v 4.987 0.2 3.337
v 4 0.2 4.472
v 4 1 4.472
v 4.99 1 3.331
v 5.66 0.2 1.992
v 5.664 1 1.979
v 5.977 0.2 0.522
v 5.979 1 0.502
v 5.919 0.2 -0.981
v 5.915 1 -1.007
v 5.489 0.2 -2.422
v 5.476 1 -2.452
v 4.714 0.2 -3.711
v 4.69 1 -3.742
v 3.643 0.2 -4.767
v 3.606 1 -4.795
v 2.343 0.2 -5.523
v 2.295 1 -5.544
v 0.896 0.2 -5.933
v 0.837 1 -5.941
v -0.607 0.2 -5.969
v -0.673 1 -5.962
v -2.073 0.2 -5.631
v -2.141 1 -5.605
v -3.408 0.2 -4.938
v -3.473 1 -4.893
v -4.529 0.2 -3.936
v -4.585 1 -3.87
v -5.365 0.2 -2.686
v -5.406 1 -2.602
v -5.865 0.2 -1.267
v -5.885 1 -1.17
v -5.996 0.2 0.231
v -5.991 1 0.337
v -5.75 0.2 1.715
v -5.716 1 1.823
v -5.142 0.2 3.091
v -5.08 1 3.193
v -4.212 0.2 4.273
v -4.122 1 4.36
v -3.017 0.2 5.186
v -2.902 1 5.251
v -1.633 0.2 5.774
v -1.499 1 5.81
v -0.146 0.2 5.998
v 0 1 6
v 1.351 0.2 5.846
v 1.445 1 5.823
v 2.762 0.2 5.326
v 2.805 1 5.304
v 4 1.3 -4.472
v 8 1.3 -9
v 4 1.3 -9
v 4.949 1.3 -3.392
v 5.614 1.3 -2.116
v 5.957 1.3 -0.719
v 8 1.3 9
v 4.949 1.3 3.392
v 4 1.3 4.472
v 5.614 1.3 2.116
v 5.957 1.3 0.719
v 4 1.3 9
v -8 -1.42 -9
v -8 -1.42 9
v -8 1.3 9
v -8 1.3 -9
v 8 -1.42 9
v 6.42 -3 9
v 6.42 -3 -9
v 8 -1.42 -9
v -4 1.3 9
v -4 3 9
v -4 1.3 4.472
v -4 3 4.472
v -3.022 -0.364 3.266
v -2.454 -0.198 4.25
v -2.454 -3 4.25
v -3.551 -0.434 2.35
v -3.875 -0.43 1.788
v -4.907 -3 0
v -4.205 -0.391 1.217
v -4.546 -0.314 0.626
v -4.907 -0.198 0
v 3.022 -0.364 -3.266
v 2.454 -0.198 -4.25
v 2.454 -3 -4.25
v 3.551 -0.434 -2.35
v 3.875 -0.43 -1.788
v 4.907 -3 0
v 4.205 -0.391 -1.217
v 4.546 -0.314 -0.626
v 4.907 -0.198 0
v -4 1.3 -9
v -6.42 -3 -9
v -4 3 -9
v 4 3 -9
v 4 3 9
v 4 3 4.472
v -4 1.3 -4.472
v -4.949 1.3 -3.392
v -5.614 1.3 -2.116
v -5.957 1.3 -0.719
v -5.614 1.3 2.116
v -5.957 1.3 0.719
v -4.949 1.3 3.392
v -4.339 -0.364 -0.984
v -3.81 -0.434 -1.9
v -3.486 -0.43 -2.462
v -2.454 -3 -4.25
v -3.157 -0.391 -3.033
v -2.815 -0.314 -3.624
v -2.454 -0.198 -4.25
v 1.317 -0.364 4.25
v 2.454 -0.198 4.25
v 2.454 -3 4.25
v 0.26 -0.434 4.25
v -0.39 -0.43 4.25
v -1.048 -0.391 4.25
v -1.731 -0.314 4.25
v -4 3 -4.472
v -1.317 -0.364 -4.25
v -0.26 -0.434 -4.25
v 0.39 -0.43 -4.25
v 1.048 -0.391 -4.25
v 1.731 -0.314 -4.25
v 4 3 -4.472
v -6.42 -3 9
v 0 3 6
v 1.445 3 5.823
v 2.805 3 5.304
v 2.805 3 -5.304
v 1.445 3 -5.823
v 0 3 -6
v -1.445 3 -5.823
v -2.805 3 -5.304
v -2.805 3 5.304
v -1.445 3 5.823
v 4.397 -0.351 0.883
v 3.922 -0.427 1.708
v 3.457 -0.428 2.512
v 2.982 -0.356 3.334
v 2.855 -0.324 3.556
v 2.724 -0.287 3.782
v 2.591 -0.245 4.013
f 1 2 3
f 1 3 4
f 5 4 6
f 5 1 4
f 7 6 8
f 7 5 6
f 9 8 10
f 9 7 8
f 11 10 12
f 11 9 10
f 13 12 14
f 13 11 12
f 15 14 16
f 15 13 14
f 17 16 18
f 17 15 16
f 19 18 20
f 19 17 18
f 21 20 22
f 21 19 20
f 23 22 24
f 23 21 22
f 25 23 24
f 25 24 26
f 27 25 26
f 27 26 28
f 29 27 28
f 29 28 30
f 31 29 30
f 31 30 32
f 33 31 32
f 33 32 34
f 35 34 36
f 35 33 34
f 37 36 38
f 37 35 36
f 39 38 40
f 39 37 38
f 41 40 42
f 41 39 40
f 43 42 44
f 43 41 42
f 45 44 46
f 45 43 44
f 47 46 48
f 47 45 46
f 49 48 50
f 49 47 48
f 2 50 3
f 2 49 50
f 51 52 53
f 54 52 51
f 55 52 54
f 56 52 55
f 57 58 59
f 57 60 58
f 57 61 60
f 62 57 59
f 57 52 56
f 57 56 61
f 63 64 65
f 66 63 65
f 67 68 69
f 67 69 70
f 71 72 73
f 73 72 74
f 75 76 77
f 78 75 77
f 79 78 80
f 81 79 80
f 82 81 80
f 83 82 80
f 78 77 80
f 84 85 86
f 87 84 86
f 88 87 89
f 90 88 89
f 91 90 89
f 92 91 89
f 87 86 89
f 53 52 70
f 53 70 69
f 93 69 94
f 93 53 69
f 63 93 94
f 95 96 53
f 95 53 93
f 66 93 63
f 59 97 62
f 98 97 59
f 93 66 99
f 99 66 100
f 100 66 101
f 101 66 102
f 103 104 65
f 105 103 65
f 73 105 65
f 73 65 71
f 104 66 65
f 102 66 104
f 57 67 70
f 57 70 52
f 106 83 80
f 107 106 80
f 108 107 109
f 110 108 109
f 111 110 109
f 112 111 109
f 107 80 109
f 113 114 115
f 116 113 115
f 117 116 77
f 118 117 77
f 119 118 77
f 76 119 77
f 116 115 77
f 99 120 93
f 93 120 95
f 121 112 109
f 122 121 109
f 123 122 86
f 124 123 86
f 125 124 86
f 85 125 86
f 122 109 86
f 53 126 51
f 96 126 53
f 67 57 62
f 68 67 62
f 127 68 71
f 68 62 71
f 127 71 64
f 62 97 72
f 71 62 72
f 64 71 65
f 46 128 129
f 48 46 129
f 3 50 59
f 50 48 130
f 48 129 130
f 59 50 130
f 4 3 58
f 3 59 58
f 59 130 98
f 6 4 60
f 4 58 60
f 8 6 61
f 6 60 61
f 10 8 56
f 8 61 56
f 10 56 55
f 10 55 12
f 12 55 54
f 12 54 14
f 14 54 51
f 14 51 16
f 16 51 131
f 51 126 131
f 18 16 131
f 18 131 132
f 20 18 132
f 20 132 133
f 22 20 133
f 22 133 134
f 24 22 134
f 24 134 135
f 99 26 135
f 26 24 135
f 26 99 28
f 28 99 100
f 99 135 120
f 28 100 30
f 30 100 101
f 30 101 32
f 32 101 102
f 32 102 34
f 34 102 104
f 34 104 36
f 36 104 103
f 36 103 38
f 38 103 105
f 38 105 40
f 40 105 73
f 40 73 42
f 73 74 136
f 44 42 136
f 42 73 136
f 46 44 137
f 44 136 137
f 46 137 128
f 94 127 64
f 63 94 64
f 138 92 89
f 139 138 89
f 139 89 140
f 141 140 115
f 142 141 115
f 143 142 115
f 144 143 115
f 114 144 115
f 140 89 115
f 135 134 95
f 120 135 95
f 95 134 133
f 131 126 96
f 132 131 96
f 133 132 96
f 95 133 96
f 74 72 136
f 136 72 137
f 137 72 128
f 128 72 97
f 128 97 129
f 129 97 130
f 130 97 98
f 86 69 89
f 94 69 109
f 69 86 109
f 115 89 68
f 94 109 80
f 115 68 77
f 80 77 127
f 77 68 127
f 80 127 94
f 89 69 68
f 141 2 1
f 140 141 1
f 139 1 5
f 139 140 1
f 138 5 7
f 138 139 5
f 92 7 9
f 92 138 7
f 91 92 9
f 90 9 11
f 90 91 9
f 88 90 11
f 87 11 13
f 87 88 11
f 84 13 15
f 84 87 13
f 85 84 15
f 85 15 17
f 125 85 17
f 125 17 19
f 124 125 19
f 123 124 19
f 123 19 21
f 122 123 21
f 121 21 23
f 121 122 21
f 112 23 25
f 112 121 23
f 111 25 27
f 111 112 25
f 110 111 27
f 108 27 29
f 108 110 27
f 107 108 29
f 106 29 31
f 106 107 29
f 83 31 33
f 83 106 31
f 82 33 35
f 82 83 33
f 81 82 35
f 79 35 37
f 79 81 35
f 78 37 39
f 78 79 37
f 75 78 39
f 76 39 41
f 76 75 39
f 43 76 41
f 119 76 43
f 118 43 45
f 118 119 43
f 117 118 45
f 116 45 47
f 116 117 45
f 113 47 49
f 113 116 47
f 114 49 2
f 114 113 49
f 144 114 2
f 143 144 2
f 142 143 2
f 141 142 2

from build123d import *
from build123d.topology import SkipClean

# Parameters (mm, degrees)
SKETCH1_W           = 18
SKETCH1_H           = 6
BOSS_EXTRUDE1_DEPTH = 4
BOSS_EXTRUDE2_DEPTH = 18
SKETCH2_R           = 6
CUT_EXTRUDE1_DEPTH  = 2
CUT_EXTRUDE2_DEPTH  = 14.453624047


with BuildPart() as part:
    # Sketch1 → Boss-Extrude1 (new, symmetric)
    with BuildSketch(Plane(origin=(0, 0, 0), x_dir=(0, 0, -1), z_dir=(1, 0, 0))):
        Rectangle(SKETCH1_W, SKETCH1_H)
    extrude(amount=BOSS_EXTRUDE1_DEPTH, both=True)

    # Sketch4 → Boss-Extrude2 (add)
    with BuildSketch(Plane.XY.offset(9)):
        Polygon((-4, 1.3), (-4, -3), (-6.42, -3), (-8, -1.42), (-8, 1.3), align=None)
        Polygon((8, -1.42), (8, 1.3), (4, 1.3), (4, -3), (6.42, -3), align=None)
    extrude(amount=-BOSS_EXTRUDE2_DEPTH)

    # Sketch2 → Cut-Extrude1 (cut)
    with BuildSketch(Plane(origin=(0, 3, 0), x_dir=(1, 0, 0), z_dir=(0, 1, 0))):
        with Locations(Location((0, 0, 0), (0, 0, 270))):
            Circle(SKETCH2_R)
    extrude(amount=-CUT_EXTRUDE1_DEPTH, mode=Mode.SUBTRACT)

    # Sketch5 → Cut-Extrude2 (cut, through all)
    with BuildSketch(Plane.XZ.offset(3)):
        Polygon((-2.453738644, 4.25), (-4.907477288, 0), (-2.453738644, -4.25), (2.453738644, -4.25), (4.907477288, 0), (2.453738644, 4.25), align=None)
    extrude(amount=-CUT_EXTRUDE2_DEPTH, mode=Mode.SUBTRACT)

    # Sketch6 → Cut-Revolve1 (revolve, cut)
    with SkipClean():  # the faces are left unmerged after this step: merging them gives an invalid solid
        with BuildSketch(Plane(origin=(0, 0, 0), x_dir=(0, 0, -1), z_dir=(1, 0, 0)), mode=Mode.PRIVATE) as cut_revolve1_sk:
            Polygon((6, 0.2), (3.668255705, -0.648685517), (3.668255705, 1), (6, 1), align=None)
        revolve(cut_revolve1_sk.sketch.rotate(Axis((0, 0, 0), (0, 1, 0)), 221.810314896), axis=Axis((0, 0, 0), (0, 1, 0)), mode=Mode.SUBTRACT)


solid = part.part
